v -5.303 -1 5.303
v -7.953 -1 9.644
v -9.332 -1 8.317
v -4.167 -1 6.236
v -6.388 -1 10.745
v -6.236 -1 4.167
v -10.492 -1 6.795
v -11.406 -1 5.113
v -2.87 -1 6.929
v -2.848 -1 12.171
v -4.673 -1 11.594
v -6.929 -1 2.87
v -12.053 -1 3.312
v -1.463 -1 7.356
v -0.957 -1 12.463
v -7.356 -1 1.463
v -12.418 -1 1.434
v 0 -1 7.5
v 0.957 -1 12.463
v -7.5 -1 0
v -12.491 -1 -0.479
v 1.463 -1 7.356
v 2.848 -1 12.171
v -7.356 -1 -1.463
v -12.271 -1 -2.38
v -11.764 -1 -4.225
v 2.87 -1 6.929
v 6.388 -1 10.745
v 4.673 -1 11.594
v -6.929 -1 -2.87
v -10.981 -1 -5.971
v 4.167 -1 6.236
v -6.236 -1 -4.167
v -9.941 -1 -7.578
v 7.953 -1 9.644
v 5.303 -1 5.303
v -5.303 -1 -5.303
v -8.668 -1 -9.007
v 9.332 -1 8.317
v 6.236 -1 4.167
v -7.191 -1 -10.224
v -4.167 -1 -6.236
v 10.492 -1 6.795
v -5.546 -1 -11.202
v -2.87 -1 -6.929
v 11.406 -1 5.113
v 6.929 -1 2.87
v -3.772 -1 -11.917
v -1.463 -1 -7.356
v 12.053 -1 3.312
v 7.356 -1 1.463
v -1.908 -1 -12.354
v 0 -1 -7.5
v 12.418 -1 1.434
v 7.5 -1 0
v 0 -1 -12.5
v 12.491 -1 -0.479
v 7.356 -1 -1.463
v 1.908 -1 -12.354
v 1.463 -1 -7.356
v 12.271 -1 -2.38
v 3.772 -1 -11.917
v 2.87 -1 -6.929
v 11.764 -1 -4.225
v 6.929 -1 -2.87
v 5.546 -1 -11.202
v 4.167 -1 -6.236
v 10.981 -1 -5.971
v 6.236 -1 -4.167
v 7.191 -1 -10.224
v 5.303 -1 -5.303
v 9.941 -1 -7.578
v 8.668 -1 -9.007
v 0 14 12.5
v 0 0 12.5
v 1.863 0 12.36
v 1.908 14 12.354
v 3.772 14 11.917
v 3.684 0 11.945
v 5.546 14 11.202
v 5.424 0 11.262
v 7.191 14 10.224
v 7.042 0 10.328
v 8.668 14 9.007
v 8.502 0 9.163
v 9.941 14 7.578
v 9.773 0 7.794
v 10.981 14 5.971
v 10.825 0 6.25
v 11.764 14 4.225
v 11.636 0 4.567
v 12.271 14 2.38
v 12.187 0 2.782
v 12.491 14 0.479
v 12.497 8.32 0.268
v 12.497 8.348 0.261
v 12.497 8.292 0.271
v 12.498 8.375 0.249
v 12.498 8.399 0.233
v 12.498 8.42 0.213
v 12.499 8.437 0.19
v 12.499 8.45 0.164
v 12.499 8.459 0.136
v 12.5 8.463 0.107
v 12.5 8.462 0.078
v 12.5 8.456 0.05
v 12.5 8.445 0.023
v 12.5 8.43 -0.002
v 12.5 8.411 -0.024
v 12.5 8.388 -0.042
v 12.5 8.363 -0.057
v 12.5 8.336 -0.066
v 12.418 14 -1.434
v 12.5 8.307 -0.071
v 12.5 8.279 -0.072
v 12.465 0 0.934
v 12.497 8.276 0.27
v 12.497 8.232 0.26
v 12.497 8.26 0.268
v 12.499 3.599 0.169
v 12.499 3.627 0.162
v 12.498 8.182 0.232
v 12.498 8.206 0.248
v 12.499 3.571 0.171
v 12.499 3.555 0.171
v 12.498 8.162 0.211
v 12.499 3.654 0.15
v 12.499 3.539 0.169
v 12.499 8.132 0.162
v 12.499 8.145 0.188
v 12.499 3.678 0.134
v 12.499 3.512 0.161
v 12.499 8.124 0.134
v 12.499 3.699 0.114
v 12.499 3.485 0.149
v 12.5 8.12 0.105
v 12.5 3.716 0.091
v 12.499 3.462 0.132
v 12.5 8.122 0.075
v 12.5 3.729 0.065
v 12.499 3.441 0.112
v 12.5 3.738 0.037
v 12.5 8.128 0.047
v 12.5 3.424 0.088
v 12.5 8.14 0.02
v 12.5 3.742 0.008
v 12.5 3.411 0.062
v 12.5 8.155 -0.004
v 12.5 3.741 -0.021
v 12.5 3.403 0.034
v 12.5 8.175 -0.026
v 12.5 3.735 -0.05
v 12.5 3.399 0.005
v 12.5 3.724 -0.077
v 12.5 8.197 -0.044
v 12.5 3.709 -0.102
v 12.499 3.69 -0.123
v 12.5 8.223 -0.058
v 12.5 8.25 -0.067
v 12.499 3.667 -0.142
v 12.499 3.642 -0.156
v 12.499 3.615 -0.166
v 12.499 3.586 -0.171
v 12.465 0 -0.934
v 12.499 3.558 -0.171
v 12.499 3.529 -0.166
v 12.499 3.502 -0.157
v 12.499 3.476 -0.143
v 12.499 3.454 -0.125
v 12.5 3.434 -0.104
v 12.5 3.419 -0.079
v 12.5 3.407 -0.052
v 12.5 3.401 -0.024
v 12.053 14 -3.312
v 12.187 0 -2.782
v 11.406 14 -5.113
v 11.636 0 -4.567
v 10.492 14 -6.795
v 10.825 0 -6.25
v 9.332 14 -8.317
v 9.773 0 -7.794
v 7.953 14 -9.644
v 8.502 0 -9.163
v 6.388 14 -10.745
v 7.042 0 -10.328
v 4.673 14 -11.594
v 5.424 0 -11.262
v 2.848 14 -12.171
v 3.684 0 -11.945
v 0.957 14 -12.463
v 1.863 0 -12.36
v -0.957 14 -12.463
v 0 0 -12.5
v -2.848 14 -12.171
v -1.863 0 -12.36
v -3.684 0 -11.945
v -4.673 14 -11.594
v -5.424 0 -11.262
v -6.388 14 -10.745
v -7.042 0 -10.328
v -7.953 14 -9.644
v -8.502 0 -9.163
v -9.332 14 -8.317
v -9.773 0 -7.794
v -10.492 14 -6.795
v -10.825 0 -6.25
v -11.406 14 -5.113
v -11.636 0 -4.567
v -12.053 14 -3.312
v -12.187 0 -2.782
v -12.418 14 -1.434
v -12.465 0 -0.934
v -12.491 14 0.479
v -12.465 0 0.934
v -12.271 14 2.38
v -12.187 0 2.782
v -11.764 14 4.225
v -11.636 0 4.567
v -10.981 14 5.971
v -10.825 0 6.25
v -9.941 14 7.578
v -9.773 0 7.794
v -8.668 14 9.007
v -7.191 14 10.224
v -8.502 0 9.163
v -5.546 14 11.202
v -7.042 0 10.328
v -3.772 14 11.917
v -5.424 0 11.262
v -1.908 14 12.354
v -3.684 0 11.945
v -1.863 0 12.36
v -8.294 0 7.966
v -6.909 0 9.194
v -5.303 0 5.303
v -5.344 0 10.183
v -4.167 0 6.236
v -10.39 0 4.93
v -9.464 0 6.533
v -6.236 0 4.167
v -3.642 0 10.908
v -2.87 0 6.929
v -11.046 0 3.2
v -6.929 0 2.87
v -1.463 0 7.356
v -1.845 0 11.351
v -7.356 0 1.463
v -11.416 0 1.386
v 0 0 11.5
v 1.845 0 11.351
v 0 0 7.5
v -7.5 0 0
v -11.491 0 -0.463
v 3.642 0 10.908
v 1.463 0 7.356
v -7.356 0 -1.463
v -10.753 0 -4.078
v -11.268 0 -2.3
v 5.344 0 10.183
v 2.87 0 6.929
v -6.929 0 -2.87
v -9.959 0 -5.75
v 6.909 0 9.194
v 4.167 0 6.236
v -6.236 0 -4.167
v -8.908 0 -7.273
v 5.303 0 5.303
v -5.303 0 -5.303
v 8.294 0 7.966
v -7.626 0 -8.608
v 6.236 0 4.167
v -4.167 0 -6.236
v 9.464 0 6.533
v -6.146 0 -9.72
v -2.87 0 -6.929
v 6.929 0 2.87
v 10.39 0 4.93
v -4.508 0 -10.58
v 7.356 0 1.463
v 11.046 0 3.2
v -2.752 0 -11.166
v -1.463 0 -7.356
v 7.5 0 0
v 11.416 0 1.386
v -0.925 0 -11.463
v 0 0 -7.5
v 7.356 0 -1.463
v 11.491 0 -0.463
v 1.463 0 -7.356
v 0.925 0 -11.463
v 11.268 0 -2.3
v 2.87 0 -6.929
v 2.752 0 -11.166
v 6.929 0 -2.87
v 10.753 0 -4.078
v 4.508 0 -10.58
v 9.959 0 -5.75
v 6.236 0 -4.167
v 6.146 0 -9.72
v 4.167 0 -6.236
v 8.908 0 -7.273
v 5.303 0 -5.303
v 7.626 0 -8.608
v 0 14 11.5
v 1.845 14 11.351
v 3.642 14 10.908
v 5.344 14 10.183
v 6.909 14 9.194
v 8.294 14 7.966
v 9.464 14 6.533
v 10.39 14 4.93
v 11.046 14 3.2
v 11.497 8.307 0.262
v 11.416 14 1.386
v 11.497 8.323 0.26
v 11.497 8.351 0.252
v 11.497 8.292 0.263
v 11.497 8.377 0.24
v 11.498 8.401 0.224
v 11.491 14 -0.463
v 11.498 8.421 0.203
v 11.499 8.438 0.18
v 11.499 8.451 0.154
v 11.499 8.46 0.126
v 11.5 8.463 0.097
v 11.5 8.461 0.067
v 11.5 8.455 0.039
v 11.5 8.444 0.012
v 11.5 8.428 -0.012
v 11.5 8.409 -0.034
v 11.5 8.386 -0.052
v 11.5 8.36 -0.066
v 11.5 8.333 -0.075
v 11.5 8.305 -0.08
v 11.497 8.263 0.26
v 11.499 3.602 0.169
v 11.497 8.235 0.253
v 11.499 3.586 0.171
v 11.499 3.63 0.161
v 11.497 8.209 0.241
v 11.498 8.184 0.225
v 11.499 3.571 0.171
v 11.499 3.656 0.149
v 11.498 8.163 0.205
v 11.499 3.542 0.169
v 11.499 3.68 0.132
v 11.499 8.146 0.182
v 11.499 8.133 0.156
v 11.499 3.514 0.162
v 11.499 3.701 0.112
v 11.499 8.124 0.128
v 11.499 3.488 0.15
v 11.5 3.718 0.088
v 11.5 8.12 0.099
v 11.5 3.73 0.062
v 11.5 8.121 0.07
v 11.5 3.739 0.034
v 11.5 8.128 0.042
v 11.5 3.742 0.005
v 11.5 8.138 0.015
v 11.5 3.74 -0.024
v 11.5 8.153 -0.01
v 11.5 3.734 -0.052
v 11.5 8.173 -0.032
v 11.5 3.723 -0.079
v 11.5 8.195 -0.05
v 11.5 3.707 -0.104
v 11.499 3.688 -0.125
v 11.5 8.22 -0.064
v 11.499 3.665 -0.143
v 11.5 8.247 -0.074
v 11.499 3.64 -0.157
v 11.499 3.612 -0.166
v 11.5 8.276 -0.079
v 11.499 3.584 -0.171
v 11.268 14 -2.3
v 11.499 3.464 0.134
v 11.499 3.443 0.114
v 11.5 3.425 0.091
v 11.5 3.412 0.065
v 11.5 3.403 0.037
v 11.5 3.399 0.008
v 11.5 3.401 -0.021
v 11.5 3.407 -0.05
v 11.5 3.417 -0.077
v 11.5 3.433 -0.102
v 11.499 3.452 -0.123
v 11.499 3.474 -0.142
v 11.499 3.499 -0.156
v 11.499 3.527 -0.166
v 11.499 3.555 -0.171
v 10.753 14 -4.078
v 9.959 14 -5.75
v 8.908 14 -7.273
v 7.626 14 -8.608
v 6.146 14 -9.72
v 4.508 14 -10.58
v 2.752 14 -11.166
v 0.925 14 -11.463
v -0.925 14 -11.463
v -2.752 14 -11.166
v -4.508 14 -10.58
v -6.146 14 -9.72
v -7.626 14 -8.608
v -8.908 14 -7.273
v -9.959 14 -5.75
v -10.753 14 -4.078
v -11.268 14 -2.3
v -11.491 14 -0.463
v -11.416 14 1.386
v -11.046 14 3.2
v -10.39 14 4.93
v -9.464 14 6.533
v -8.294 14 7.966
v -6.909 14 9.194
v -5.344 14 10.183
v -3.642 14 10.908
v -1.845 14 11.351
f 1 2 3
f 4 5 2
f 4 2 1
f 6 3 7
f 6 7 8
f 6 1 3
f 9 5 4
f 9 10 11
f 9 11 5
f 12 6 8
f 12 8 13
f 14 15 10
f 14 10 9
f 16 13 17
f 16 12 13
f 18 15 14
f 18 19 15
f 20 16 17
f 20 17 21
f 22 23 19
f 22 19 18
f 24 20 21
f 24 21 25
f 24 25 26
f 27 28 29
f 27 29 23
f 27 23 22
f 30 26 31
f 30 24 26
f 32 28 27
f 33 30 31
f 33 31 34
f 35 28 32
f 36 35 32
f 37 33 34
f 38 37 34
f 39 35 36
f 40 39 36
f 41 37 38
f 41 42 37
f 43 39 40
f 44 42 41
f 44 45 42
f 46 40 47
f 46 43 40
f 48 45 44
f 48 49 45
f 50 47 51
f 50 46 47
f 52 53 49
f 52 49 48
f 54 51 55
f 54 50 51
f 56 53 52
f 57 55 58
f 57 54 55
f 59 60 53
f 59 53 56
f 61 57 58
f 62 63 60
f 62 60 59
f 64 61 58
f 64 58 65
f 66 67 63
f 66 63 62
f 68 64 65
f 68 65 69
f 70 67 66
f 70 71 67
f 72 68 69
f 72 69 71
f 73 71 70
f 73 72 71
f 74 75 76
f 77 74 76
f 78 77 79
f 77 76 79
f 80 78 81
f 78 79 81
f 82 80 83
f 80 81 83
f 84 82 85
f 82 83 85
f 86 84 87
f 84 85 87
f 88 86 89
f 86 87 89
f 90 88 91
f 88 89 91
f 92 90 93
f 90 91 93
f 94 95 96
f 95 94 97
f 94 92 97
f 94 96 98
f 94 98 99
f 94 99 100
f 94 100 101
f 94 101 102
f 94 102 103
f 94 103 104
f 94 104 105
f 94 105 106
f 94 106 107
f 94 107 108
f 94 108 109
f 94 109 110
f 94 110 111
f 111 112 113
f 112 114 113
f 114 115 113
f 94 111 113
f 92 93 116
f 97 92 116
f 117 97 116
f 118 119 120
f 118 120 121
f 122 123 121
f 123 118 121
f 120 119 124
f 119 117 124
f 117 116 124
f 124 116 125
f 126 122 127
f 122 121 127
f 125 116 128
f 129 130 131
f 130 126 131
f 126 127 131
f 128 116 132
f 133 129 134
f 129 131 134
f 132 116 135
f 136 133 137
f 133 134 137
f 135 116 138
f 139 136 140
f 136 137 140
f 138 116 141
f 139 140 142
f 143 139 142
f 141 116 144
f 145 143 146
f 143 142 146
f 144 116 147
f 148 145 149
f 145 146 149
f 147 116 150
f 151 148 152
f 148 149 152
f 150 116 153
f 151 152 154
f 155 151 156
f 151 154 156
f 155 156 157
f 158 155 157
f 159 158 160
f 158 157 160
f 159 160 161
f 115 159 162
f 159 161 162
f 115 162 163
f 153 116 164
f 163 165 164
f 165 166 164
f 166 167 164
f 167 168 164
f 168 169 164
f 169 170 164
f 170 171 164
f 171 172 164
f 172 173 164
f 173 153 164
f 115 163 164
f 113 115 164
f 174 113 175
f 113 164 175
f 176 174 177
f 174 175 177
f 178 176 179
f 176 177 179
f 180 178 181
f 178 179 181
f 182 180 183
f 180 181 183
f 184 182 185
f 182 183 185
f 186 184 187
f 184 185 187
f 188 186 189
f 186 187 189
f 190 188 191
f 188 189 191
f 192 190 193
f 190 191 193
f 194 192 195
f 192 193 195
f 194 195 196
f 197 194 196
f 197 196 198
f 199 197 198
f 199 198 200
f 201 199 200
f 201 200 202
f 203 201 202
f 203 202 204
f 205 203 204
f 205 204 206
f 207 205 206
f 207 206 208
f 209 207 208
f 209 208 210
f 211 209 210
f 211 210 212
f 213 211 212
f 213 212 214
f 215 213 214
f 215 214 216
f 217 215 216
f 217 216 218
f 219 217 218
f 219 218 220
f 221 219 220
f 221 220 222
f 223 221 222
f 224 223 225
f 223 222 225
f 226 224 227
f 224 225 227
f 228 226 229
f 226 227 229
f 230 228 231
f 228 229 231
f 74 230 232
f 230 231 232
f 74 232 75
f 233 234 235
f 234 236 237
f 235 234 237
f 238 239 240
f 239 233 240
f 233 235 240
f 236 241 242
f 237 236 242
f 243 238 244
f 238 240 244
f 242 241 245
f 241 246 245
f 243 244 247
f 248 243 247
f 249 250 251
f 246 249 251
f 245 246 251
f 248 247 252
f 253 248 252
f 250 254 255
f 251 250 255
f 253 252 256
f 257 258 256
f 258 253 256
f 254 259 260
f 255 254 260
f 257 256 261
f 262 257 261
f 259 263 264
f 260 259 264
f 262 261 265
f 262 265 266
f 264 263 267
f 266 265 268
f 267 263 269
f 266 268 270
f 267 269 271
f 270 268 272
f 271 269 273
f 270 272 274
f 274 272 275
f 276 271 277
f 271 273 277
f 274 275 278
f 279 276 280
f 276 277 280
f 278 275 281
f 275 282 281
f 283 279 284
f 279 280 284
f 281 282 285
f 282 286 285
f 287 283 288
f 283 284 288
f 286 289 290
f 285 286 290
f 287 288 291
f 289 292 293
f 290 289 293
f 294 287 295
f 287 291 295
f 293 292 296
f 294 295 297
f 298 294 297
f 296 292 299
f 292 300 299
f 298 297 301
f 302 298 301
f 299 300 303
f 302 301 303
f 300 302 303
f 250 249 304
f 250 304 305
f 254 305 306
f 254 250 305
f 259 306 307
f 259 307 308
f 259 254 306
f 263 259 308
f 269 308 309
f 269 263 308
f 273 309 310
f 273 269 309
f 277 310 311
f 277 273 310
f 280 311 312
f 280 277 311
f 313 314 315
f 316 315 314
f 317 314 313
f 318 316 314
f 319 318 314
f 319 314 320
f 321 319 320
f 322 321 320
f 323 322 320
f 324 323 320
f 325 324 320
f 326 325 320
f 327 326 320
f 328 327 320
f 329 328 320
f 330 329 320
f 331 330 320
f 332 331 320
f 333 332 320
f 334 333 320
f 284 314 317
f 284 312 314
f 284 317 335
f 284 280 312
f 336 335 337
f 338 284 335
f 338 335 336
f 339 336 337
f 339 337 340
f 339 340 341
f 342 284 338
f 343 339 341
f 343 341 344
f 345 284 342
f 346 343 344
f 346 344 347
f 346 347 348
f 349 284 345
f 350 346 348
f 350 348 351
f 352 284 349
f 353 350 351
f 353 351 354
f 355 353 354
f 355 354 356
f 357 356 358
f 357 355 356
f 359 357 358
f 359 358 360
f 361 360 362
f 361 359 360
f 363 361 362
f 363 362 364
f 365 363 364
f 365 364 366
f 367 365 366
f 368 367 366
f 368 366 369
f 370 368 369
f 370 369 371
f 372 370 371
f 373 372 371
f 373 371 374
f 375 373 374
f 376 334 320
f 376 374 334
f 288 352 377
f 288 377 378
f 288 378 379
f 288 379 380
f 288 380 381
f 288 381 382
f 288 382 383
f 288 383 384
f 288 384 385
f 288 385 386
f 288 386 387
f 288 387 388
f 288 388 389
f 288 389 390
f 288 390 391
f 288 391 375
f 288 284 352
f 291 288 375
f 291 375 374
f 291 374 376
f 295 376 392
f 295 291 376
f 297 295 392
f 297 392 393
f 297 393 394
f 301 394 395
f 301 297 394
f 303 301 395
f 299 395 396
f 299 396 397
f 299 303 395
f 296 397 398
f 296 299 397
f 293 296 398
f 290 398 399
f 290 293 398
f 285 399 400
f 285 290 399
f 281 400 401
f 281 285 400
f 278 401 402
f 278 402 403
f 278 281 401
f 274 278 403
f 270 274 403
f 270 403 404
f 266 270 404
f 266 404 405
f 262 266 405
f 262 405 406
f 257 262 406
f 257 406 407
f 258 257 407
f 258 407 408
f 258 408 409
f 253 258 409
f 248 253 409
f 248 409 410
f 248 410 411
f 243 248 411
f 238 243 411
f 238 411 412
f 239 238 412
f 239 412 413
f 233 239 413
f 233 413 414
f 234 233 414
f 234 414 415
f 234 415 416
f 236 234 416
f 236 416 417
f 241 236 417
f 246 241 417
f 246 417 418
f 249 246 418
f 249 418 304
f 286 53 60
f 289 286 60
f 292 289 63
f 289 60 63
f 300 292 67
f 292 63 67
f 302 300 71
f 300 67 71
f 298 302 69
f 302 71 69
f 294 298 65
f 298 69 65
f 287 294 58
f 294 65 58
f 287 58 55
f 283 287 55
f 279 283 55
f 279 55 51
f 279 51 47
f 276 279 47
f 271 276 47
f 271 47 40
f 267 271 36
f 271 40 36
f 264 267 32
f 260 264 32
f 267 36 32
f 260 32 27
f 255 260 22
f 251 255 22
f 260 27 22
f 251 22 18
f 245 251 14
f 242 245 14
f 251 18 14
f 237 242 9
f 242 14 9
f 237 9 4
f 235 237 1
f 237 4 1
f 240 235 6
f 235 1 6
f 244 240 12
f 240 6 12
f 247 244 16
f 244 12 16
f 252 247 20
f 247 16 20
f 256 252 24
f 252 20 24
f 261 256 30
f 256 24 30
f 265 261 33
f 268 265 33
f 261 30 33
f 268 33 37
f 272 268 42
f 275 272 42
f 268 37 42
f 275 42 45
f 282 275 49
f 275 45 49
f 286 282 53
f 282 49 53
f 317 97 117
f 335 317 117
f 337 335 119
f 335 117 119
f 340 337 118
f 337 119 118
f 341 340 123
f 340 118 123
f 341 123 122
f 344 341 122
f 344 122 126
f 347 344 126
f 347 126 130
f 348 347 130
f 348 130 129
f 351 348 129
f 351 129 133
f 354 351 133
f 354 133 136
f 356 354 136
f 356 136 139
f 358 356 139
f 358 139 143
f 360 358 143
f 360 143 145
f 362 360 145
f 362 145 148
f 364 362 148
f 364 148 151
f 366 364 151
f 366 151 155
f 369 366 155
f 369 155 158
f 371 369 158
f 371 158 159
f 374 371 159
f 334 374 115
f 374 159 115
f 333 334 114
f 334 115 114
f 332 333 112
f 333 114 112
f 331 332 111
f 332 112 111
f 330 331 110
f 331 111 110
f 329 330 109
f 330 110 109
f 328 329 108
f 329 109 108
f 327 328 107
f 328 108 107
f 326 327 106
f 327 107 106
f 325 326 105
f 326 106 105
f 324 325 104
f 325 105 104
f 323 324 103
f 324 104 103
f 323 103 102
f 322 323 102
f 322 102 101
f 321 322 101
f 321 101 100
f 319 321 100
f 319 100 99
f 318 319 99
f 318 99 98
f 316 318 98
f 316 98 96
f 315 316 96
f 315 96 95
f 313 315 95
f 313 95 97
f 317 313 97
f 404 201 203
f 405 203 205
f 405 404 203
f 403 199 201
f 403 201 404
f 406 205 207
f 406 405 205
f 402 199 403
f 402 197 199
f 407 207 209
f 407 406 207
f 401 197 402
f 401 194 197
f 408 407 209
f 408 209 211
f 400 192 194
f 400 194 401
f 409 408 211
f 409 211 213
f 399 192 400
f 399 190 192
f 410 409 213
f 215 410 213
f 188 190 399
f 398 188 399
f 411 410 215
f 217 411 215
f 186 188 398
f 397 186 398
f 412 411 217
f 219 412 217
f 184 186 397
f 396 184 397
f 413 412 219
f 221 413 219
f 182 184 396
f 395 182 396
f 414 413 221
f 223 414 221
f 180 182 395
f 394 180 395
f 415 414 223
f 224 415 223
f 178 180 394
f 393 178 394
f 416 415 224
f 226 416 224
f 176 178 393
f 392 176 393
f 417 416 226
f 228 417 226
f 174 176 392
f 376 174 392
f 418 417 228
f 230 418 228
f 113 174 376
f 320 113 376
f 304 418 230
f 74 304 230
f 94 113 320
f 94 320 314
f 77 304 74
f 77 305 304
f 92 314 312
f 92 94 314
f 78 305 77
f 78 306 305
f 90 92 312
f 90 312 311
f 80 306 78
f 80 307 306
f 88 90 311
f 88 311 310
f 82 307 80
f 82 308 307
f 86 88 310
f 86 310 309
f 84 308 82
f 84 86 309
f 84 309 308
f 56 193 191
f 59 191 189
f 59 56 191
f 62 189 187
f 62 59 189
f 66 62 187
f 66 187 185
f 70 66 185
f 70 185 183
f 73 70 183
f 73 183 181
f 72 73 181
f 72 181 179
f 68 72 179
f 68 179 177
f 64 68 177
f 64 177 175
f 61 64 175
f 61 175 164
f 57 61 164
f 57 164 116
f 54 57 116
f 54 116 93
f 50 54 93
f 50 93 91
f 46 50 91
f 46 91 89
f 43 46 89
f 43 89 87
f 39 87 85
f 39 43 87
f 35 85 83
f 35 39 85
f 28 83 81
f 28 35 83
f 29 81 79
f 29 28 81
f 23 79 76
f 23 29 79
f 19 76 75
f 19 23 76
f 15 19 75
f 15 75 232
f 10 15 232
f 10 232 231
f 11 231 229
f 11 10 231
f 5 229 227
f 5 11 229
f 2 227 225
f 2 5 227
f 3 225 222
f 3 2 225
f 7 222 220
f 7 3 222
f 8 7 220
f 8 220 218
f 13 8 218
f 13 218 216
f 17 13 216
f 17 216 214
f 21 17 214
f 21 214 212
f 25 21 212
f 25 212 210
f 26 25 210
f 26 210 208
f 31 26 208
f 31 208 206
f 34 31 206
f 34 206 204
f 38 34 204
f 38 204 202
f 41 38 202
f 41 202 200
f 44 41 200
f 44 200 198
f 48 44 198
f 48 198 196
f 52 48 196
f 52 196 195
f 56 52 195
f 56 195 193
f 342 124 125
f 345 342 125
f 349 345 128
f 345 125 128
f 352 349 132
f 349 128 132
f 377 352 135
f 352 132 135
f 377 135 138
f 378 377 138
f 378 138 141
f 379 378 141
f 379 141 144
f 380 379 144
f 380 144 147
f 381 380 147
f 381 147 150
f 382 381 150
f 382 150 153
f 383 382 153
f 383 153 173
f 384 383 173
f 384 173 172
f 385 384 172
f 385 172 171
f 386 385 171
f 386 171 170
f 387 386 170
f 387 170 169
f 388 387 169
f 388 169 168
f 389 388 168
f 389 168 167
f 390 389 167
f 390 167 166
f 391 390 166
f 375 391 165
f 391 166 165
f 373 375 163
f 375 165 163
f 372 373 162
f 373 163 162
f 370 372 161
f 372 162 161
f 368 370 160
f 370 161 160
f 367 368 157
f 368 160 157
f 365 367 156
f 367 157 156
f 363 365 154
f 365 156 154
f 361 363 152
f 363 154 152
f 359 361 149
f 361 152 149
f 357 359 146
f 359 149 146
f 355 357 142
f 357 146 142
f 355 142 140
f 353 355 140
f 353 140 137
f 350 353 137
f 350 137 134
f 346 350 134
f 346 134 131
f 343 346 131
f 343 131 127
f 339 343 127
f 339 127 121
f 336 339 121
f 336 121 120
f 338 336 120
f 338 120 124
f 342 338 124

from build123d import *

# Parameters (mm, degrees)
SKETCH1_R                         = 12.5
SKETCH1_R_2                       = 11.5
BOSS_EXTRUDE1_DEPTH               = 14
BOSS_EXTRUDE2_START               = 1
SKETCH2_R                         = 12.5
SKETCH2_R_2                       = 7.5
BOSS_EXTRUDE2_DEPTH               = 1
F_80_0_0135_DIAMETER_HOLE1_REACH  = 31.497
F_80_0_0135_DIAMETER_HOLE1_BORE_R = 0.17145
F_80_0_0135_DIAMETER_HOLE2_REACH  = 31.833
F_80_0_0135_DIAMETER_HOLE2_BORE_R = 0.17145


with BuildPart() as part:
    # Sketch1 → Boss-Extrude1 (new body)
    with BuildSketch(Plane(origin=(0, 0, 0), x_dir=(1, 0, 0), z_dir=(0, 1, 0))):
        with Locations(Location((0, 0, 0), (0, 0, 270))):
            Circle(SKETCH1_R)
        with Locations(Location((0, 0, 0), (0, 0, 270))):
            Circle(SKETCH1_R_2, mode=Mode.SUBTRACT)
    extrude(amount=BOSS_EXTRUDE1_DEPTH)

    # Sketch2 → Boss-Extrude2 (add)
    with BuildSketch(Plane(origin=(0, 0, 0), x_dir=(-1, 0, 0), z_dir=(0, -1, 0)).offset(BOSS_EXTRUDE2_START)):
        with Locations(Location((0, 0, 0), (0, 0, 90))):
            Circle(SKETCH2_R)
        with Locations(Location((0, 0, 0), (0, 0, 90))):
            Circle(SKETCH2_R_2, mode=Mode.SUBTRACT)
    extrude(amount=-BOSS_EXTRUDE2_DEPTH)

    # #80 (0.0135) Diameter Hole1 bore (on position points) → #80 (0.0135) Diameter Hole1 (cut, up to next)
    with BuildSketch(Plane(origin=(12.499604816, 8.291561976, 0.099395334), x_dir=(-0.00795162675, 0, 0.999968385316), z_dir=(0.999968385316, 0, 0.00795162675)), mode=Mode.PRIVATE) as f_80_0_0135_diameter_hole1_sk1:
        Circle(F_80_0_0135_DIAMETER_HOLE1_BORE_R)
    f_80_0_0135_diameter_hole1_tool1 = extrude(f_80_0_0135_diameter_hole1_sk1.sketch, amount=-F_80_0_0135_DIAMETER_HOLE1_REACH, mode=Mode.PRIVATE) & part.part
    add(f_80_0_0135_diameter_hole1_tool1.solids().sort_by_distance((12.499605, 8.291562, 0.099395))[0], mode=Mode.SUBTRACT)

    # #80 (0.0135) Diameter Hole2 bore (on position points) → #80 (0.0135) Diameter Hole2 (cut, up to next)
    with BuildSketch(Plane(origin=(12.5, 3.570714214, 0), x_dir=(0, 0, 1), z_dir=(1, 0, 0)), mode=Mode.PRIVATE) as f_80_0_0135_diameter_hole2_sk1:
        Circle(F_80_0_0135_DIAMETER_HOLE2_BORE_R)
    f_80_0_0135_diameter_hole2_tool1 = extrude(f_80_0_0135_diameter_hole2_sk1.sketch, amount=-F_80_0_0135_DIAMETER_HOLE2_REACH, mode=Mode.PRIVATE) & part.part
    add(f_80_0_0135_diameter_hole2_tool1.solids().sort_by_distance((12.5, 3.570714, 0))[0], mode=Mode.SUBTRACT)


solid = part.part
